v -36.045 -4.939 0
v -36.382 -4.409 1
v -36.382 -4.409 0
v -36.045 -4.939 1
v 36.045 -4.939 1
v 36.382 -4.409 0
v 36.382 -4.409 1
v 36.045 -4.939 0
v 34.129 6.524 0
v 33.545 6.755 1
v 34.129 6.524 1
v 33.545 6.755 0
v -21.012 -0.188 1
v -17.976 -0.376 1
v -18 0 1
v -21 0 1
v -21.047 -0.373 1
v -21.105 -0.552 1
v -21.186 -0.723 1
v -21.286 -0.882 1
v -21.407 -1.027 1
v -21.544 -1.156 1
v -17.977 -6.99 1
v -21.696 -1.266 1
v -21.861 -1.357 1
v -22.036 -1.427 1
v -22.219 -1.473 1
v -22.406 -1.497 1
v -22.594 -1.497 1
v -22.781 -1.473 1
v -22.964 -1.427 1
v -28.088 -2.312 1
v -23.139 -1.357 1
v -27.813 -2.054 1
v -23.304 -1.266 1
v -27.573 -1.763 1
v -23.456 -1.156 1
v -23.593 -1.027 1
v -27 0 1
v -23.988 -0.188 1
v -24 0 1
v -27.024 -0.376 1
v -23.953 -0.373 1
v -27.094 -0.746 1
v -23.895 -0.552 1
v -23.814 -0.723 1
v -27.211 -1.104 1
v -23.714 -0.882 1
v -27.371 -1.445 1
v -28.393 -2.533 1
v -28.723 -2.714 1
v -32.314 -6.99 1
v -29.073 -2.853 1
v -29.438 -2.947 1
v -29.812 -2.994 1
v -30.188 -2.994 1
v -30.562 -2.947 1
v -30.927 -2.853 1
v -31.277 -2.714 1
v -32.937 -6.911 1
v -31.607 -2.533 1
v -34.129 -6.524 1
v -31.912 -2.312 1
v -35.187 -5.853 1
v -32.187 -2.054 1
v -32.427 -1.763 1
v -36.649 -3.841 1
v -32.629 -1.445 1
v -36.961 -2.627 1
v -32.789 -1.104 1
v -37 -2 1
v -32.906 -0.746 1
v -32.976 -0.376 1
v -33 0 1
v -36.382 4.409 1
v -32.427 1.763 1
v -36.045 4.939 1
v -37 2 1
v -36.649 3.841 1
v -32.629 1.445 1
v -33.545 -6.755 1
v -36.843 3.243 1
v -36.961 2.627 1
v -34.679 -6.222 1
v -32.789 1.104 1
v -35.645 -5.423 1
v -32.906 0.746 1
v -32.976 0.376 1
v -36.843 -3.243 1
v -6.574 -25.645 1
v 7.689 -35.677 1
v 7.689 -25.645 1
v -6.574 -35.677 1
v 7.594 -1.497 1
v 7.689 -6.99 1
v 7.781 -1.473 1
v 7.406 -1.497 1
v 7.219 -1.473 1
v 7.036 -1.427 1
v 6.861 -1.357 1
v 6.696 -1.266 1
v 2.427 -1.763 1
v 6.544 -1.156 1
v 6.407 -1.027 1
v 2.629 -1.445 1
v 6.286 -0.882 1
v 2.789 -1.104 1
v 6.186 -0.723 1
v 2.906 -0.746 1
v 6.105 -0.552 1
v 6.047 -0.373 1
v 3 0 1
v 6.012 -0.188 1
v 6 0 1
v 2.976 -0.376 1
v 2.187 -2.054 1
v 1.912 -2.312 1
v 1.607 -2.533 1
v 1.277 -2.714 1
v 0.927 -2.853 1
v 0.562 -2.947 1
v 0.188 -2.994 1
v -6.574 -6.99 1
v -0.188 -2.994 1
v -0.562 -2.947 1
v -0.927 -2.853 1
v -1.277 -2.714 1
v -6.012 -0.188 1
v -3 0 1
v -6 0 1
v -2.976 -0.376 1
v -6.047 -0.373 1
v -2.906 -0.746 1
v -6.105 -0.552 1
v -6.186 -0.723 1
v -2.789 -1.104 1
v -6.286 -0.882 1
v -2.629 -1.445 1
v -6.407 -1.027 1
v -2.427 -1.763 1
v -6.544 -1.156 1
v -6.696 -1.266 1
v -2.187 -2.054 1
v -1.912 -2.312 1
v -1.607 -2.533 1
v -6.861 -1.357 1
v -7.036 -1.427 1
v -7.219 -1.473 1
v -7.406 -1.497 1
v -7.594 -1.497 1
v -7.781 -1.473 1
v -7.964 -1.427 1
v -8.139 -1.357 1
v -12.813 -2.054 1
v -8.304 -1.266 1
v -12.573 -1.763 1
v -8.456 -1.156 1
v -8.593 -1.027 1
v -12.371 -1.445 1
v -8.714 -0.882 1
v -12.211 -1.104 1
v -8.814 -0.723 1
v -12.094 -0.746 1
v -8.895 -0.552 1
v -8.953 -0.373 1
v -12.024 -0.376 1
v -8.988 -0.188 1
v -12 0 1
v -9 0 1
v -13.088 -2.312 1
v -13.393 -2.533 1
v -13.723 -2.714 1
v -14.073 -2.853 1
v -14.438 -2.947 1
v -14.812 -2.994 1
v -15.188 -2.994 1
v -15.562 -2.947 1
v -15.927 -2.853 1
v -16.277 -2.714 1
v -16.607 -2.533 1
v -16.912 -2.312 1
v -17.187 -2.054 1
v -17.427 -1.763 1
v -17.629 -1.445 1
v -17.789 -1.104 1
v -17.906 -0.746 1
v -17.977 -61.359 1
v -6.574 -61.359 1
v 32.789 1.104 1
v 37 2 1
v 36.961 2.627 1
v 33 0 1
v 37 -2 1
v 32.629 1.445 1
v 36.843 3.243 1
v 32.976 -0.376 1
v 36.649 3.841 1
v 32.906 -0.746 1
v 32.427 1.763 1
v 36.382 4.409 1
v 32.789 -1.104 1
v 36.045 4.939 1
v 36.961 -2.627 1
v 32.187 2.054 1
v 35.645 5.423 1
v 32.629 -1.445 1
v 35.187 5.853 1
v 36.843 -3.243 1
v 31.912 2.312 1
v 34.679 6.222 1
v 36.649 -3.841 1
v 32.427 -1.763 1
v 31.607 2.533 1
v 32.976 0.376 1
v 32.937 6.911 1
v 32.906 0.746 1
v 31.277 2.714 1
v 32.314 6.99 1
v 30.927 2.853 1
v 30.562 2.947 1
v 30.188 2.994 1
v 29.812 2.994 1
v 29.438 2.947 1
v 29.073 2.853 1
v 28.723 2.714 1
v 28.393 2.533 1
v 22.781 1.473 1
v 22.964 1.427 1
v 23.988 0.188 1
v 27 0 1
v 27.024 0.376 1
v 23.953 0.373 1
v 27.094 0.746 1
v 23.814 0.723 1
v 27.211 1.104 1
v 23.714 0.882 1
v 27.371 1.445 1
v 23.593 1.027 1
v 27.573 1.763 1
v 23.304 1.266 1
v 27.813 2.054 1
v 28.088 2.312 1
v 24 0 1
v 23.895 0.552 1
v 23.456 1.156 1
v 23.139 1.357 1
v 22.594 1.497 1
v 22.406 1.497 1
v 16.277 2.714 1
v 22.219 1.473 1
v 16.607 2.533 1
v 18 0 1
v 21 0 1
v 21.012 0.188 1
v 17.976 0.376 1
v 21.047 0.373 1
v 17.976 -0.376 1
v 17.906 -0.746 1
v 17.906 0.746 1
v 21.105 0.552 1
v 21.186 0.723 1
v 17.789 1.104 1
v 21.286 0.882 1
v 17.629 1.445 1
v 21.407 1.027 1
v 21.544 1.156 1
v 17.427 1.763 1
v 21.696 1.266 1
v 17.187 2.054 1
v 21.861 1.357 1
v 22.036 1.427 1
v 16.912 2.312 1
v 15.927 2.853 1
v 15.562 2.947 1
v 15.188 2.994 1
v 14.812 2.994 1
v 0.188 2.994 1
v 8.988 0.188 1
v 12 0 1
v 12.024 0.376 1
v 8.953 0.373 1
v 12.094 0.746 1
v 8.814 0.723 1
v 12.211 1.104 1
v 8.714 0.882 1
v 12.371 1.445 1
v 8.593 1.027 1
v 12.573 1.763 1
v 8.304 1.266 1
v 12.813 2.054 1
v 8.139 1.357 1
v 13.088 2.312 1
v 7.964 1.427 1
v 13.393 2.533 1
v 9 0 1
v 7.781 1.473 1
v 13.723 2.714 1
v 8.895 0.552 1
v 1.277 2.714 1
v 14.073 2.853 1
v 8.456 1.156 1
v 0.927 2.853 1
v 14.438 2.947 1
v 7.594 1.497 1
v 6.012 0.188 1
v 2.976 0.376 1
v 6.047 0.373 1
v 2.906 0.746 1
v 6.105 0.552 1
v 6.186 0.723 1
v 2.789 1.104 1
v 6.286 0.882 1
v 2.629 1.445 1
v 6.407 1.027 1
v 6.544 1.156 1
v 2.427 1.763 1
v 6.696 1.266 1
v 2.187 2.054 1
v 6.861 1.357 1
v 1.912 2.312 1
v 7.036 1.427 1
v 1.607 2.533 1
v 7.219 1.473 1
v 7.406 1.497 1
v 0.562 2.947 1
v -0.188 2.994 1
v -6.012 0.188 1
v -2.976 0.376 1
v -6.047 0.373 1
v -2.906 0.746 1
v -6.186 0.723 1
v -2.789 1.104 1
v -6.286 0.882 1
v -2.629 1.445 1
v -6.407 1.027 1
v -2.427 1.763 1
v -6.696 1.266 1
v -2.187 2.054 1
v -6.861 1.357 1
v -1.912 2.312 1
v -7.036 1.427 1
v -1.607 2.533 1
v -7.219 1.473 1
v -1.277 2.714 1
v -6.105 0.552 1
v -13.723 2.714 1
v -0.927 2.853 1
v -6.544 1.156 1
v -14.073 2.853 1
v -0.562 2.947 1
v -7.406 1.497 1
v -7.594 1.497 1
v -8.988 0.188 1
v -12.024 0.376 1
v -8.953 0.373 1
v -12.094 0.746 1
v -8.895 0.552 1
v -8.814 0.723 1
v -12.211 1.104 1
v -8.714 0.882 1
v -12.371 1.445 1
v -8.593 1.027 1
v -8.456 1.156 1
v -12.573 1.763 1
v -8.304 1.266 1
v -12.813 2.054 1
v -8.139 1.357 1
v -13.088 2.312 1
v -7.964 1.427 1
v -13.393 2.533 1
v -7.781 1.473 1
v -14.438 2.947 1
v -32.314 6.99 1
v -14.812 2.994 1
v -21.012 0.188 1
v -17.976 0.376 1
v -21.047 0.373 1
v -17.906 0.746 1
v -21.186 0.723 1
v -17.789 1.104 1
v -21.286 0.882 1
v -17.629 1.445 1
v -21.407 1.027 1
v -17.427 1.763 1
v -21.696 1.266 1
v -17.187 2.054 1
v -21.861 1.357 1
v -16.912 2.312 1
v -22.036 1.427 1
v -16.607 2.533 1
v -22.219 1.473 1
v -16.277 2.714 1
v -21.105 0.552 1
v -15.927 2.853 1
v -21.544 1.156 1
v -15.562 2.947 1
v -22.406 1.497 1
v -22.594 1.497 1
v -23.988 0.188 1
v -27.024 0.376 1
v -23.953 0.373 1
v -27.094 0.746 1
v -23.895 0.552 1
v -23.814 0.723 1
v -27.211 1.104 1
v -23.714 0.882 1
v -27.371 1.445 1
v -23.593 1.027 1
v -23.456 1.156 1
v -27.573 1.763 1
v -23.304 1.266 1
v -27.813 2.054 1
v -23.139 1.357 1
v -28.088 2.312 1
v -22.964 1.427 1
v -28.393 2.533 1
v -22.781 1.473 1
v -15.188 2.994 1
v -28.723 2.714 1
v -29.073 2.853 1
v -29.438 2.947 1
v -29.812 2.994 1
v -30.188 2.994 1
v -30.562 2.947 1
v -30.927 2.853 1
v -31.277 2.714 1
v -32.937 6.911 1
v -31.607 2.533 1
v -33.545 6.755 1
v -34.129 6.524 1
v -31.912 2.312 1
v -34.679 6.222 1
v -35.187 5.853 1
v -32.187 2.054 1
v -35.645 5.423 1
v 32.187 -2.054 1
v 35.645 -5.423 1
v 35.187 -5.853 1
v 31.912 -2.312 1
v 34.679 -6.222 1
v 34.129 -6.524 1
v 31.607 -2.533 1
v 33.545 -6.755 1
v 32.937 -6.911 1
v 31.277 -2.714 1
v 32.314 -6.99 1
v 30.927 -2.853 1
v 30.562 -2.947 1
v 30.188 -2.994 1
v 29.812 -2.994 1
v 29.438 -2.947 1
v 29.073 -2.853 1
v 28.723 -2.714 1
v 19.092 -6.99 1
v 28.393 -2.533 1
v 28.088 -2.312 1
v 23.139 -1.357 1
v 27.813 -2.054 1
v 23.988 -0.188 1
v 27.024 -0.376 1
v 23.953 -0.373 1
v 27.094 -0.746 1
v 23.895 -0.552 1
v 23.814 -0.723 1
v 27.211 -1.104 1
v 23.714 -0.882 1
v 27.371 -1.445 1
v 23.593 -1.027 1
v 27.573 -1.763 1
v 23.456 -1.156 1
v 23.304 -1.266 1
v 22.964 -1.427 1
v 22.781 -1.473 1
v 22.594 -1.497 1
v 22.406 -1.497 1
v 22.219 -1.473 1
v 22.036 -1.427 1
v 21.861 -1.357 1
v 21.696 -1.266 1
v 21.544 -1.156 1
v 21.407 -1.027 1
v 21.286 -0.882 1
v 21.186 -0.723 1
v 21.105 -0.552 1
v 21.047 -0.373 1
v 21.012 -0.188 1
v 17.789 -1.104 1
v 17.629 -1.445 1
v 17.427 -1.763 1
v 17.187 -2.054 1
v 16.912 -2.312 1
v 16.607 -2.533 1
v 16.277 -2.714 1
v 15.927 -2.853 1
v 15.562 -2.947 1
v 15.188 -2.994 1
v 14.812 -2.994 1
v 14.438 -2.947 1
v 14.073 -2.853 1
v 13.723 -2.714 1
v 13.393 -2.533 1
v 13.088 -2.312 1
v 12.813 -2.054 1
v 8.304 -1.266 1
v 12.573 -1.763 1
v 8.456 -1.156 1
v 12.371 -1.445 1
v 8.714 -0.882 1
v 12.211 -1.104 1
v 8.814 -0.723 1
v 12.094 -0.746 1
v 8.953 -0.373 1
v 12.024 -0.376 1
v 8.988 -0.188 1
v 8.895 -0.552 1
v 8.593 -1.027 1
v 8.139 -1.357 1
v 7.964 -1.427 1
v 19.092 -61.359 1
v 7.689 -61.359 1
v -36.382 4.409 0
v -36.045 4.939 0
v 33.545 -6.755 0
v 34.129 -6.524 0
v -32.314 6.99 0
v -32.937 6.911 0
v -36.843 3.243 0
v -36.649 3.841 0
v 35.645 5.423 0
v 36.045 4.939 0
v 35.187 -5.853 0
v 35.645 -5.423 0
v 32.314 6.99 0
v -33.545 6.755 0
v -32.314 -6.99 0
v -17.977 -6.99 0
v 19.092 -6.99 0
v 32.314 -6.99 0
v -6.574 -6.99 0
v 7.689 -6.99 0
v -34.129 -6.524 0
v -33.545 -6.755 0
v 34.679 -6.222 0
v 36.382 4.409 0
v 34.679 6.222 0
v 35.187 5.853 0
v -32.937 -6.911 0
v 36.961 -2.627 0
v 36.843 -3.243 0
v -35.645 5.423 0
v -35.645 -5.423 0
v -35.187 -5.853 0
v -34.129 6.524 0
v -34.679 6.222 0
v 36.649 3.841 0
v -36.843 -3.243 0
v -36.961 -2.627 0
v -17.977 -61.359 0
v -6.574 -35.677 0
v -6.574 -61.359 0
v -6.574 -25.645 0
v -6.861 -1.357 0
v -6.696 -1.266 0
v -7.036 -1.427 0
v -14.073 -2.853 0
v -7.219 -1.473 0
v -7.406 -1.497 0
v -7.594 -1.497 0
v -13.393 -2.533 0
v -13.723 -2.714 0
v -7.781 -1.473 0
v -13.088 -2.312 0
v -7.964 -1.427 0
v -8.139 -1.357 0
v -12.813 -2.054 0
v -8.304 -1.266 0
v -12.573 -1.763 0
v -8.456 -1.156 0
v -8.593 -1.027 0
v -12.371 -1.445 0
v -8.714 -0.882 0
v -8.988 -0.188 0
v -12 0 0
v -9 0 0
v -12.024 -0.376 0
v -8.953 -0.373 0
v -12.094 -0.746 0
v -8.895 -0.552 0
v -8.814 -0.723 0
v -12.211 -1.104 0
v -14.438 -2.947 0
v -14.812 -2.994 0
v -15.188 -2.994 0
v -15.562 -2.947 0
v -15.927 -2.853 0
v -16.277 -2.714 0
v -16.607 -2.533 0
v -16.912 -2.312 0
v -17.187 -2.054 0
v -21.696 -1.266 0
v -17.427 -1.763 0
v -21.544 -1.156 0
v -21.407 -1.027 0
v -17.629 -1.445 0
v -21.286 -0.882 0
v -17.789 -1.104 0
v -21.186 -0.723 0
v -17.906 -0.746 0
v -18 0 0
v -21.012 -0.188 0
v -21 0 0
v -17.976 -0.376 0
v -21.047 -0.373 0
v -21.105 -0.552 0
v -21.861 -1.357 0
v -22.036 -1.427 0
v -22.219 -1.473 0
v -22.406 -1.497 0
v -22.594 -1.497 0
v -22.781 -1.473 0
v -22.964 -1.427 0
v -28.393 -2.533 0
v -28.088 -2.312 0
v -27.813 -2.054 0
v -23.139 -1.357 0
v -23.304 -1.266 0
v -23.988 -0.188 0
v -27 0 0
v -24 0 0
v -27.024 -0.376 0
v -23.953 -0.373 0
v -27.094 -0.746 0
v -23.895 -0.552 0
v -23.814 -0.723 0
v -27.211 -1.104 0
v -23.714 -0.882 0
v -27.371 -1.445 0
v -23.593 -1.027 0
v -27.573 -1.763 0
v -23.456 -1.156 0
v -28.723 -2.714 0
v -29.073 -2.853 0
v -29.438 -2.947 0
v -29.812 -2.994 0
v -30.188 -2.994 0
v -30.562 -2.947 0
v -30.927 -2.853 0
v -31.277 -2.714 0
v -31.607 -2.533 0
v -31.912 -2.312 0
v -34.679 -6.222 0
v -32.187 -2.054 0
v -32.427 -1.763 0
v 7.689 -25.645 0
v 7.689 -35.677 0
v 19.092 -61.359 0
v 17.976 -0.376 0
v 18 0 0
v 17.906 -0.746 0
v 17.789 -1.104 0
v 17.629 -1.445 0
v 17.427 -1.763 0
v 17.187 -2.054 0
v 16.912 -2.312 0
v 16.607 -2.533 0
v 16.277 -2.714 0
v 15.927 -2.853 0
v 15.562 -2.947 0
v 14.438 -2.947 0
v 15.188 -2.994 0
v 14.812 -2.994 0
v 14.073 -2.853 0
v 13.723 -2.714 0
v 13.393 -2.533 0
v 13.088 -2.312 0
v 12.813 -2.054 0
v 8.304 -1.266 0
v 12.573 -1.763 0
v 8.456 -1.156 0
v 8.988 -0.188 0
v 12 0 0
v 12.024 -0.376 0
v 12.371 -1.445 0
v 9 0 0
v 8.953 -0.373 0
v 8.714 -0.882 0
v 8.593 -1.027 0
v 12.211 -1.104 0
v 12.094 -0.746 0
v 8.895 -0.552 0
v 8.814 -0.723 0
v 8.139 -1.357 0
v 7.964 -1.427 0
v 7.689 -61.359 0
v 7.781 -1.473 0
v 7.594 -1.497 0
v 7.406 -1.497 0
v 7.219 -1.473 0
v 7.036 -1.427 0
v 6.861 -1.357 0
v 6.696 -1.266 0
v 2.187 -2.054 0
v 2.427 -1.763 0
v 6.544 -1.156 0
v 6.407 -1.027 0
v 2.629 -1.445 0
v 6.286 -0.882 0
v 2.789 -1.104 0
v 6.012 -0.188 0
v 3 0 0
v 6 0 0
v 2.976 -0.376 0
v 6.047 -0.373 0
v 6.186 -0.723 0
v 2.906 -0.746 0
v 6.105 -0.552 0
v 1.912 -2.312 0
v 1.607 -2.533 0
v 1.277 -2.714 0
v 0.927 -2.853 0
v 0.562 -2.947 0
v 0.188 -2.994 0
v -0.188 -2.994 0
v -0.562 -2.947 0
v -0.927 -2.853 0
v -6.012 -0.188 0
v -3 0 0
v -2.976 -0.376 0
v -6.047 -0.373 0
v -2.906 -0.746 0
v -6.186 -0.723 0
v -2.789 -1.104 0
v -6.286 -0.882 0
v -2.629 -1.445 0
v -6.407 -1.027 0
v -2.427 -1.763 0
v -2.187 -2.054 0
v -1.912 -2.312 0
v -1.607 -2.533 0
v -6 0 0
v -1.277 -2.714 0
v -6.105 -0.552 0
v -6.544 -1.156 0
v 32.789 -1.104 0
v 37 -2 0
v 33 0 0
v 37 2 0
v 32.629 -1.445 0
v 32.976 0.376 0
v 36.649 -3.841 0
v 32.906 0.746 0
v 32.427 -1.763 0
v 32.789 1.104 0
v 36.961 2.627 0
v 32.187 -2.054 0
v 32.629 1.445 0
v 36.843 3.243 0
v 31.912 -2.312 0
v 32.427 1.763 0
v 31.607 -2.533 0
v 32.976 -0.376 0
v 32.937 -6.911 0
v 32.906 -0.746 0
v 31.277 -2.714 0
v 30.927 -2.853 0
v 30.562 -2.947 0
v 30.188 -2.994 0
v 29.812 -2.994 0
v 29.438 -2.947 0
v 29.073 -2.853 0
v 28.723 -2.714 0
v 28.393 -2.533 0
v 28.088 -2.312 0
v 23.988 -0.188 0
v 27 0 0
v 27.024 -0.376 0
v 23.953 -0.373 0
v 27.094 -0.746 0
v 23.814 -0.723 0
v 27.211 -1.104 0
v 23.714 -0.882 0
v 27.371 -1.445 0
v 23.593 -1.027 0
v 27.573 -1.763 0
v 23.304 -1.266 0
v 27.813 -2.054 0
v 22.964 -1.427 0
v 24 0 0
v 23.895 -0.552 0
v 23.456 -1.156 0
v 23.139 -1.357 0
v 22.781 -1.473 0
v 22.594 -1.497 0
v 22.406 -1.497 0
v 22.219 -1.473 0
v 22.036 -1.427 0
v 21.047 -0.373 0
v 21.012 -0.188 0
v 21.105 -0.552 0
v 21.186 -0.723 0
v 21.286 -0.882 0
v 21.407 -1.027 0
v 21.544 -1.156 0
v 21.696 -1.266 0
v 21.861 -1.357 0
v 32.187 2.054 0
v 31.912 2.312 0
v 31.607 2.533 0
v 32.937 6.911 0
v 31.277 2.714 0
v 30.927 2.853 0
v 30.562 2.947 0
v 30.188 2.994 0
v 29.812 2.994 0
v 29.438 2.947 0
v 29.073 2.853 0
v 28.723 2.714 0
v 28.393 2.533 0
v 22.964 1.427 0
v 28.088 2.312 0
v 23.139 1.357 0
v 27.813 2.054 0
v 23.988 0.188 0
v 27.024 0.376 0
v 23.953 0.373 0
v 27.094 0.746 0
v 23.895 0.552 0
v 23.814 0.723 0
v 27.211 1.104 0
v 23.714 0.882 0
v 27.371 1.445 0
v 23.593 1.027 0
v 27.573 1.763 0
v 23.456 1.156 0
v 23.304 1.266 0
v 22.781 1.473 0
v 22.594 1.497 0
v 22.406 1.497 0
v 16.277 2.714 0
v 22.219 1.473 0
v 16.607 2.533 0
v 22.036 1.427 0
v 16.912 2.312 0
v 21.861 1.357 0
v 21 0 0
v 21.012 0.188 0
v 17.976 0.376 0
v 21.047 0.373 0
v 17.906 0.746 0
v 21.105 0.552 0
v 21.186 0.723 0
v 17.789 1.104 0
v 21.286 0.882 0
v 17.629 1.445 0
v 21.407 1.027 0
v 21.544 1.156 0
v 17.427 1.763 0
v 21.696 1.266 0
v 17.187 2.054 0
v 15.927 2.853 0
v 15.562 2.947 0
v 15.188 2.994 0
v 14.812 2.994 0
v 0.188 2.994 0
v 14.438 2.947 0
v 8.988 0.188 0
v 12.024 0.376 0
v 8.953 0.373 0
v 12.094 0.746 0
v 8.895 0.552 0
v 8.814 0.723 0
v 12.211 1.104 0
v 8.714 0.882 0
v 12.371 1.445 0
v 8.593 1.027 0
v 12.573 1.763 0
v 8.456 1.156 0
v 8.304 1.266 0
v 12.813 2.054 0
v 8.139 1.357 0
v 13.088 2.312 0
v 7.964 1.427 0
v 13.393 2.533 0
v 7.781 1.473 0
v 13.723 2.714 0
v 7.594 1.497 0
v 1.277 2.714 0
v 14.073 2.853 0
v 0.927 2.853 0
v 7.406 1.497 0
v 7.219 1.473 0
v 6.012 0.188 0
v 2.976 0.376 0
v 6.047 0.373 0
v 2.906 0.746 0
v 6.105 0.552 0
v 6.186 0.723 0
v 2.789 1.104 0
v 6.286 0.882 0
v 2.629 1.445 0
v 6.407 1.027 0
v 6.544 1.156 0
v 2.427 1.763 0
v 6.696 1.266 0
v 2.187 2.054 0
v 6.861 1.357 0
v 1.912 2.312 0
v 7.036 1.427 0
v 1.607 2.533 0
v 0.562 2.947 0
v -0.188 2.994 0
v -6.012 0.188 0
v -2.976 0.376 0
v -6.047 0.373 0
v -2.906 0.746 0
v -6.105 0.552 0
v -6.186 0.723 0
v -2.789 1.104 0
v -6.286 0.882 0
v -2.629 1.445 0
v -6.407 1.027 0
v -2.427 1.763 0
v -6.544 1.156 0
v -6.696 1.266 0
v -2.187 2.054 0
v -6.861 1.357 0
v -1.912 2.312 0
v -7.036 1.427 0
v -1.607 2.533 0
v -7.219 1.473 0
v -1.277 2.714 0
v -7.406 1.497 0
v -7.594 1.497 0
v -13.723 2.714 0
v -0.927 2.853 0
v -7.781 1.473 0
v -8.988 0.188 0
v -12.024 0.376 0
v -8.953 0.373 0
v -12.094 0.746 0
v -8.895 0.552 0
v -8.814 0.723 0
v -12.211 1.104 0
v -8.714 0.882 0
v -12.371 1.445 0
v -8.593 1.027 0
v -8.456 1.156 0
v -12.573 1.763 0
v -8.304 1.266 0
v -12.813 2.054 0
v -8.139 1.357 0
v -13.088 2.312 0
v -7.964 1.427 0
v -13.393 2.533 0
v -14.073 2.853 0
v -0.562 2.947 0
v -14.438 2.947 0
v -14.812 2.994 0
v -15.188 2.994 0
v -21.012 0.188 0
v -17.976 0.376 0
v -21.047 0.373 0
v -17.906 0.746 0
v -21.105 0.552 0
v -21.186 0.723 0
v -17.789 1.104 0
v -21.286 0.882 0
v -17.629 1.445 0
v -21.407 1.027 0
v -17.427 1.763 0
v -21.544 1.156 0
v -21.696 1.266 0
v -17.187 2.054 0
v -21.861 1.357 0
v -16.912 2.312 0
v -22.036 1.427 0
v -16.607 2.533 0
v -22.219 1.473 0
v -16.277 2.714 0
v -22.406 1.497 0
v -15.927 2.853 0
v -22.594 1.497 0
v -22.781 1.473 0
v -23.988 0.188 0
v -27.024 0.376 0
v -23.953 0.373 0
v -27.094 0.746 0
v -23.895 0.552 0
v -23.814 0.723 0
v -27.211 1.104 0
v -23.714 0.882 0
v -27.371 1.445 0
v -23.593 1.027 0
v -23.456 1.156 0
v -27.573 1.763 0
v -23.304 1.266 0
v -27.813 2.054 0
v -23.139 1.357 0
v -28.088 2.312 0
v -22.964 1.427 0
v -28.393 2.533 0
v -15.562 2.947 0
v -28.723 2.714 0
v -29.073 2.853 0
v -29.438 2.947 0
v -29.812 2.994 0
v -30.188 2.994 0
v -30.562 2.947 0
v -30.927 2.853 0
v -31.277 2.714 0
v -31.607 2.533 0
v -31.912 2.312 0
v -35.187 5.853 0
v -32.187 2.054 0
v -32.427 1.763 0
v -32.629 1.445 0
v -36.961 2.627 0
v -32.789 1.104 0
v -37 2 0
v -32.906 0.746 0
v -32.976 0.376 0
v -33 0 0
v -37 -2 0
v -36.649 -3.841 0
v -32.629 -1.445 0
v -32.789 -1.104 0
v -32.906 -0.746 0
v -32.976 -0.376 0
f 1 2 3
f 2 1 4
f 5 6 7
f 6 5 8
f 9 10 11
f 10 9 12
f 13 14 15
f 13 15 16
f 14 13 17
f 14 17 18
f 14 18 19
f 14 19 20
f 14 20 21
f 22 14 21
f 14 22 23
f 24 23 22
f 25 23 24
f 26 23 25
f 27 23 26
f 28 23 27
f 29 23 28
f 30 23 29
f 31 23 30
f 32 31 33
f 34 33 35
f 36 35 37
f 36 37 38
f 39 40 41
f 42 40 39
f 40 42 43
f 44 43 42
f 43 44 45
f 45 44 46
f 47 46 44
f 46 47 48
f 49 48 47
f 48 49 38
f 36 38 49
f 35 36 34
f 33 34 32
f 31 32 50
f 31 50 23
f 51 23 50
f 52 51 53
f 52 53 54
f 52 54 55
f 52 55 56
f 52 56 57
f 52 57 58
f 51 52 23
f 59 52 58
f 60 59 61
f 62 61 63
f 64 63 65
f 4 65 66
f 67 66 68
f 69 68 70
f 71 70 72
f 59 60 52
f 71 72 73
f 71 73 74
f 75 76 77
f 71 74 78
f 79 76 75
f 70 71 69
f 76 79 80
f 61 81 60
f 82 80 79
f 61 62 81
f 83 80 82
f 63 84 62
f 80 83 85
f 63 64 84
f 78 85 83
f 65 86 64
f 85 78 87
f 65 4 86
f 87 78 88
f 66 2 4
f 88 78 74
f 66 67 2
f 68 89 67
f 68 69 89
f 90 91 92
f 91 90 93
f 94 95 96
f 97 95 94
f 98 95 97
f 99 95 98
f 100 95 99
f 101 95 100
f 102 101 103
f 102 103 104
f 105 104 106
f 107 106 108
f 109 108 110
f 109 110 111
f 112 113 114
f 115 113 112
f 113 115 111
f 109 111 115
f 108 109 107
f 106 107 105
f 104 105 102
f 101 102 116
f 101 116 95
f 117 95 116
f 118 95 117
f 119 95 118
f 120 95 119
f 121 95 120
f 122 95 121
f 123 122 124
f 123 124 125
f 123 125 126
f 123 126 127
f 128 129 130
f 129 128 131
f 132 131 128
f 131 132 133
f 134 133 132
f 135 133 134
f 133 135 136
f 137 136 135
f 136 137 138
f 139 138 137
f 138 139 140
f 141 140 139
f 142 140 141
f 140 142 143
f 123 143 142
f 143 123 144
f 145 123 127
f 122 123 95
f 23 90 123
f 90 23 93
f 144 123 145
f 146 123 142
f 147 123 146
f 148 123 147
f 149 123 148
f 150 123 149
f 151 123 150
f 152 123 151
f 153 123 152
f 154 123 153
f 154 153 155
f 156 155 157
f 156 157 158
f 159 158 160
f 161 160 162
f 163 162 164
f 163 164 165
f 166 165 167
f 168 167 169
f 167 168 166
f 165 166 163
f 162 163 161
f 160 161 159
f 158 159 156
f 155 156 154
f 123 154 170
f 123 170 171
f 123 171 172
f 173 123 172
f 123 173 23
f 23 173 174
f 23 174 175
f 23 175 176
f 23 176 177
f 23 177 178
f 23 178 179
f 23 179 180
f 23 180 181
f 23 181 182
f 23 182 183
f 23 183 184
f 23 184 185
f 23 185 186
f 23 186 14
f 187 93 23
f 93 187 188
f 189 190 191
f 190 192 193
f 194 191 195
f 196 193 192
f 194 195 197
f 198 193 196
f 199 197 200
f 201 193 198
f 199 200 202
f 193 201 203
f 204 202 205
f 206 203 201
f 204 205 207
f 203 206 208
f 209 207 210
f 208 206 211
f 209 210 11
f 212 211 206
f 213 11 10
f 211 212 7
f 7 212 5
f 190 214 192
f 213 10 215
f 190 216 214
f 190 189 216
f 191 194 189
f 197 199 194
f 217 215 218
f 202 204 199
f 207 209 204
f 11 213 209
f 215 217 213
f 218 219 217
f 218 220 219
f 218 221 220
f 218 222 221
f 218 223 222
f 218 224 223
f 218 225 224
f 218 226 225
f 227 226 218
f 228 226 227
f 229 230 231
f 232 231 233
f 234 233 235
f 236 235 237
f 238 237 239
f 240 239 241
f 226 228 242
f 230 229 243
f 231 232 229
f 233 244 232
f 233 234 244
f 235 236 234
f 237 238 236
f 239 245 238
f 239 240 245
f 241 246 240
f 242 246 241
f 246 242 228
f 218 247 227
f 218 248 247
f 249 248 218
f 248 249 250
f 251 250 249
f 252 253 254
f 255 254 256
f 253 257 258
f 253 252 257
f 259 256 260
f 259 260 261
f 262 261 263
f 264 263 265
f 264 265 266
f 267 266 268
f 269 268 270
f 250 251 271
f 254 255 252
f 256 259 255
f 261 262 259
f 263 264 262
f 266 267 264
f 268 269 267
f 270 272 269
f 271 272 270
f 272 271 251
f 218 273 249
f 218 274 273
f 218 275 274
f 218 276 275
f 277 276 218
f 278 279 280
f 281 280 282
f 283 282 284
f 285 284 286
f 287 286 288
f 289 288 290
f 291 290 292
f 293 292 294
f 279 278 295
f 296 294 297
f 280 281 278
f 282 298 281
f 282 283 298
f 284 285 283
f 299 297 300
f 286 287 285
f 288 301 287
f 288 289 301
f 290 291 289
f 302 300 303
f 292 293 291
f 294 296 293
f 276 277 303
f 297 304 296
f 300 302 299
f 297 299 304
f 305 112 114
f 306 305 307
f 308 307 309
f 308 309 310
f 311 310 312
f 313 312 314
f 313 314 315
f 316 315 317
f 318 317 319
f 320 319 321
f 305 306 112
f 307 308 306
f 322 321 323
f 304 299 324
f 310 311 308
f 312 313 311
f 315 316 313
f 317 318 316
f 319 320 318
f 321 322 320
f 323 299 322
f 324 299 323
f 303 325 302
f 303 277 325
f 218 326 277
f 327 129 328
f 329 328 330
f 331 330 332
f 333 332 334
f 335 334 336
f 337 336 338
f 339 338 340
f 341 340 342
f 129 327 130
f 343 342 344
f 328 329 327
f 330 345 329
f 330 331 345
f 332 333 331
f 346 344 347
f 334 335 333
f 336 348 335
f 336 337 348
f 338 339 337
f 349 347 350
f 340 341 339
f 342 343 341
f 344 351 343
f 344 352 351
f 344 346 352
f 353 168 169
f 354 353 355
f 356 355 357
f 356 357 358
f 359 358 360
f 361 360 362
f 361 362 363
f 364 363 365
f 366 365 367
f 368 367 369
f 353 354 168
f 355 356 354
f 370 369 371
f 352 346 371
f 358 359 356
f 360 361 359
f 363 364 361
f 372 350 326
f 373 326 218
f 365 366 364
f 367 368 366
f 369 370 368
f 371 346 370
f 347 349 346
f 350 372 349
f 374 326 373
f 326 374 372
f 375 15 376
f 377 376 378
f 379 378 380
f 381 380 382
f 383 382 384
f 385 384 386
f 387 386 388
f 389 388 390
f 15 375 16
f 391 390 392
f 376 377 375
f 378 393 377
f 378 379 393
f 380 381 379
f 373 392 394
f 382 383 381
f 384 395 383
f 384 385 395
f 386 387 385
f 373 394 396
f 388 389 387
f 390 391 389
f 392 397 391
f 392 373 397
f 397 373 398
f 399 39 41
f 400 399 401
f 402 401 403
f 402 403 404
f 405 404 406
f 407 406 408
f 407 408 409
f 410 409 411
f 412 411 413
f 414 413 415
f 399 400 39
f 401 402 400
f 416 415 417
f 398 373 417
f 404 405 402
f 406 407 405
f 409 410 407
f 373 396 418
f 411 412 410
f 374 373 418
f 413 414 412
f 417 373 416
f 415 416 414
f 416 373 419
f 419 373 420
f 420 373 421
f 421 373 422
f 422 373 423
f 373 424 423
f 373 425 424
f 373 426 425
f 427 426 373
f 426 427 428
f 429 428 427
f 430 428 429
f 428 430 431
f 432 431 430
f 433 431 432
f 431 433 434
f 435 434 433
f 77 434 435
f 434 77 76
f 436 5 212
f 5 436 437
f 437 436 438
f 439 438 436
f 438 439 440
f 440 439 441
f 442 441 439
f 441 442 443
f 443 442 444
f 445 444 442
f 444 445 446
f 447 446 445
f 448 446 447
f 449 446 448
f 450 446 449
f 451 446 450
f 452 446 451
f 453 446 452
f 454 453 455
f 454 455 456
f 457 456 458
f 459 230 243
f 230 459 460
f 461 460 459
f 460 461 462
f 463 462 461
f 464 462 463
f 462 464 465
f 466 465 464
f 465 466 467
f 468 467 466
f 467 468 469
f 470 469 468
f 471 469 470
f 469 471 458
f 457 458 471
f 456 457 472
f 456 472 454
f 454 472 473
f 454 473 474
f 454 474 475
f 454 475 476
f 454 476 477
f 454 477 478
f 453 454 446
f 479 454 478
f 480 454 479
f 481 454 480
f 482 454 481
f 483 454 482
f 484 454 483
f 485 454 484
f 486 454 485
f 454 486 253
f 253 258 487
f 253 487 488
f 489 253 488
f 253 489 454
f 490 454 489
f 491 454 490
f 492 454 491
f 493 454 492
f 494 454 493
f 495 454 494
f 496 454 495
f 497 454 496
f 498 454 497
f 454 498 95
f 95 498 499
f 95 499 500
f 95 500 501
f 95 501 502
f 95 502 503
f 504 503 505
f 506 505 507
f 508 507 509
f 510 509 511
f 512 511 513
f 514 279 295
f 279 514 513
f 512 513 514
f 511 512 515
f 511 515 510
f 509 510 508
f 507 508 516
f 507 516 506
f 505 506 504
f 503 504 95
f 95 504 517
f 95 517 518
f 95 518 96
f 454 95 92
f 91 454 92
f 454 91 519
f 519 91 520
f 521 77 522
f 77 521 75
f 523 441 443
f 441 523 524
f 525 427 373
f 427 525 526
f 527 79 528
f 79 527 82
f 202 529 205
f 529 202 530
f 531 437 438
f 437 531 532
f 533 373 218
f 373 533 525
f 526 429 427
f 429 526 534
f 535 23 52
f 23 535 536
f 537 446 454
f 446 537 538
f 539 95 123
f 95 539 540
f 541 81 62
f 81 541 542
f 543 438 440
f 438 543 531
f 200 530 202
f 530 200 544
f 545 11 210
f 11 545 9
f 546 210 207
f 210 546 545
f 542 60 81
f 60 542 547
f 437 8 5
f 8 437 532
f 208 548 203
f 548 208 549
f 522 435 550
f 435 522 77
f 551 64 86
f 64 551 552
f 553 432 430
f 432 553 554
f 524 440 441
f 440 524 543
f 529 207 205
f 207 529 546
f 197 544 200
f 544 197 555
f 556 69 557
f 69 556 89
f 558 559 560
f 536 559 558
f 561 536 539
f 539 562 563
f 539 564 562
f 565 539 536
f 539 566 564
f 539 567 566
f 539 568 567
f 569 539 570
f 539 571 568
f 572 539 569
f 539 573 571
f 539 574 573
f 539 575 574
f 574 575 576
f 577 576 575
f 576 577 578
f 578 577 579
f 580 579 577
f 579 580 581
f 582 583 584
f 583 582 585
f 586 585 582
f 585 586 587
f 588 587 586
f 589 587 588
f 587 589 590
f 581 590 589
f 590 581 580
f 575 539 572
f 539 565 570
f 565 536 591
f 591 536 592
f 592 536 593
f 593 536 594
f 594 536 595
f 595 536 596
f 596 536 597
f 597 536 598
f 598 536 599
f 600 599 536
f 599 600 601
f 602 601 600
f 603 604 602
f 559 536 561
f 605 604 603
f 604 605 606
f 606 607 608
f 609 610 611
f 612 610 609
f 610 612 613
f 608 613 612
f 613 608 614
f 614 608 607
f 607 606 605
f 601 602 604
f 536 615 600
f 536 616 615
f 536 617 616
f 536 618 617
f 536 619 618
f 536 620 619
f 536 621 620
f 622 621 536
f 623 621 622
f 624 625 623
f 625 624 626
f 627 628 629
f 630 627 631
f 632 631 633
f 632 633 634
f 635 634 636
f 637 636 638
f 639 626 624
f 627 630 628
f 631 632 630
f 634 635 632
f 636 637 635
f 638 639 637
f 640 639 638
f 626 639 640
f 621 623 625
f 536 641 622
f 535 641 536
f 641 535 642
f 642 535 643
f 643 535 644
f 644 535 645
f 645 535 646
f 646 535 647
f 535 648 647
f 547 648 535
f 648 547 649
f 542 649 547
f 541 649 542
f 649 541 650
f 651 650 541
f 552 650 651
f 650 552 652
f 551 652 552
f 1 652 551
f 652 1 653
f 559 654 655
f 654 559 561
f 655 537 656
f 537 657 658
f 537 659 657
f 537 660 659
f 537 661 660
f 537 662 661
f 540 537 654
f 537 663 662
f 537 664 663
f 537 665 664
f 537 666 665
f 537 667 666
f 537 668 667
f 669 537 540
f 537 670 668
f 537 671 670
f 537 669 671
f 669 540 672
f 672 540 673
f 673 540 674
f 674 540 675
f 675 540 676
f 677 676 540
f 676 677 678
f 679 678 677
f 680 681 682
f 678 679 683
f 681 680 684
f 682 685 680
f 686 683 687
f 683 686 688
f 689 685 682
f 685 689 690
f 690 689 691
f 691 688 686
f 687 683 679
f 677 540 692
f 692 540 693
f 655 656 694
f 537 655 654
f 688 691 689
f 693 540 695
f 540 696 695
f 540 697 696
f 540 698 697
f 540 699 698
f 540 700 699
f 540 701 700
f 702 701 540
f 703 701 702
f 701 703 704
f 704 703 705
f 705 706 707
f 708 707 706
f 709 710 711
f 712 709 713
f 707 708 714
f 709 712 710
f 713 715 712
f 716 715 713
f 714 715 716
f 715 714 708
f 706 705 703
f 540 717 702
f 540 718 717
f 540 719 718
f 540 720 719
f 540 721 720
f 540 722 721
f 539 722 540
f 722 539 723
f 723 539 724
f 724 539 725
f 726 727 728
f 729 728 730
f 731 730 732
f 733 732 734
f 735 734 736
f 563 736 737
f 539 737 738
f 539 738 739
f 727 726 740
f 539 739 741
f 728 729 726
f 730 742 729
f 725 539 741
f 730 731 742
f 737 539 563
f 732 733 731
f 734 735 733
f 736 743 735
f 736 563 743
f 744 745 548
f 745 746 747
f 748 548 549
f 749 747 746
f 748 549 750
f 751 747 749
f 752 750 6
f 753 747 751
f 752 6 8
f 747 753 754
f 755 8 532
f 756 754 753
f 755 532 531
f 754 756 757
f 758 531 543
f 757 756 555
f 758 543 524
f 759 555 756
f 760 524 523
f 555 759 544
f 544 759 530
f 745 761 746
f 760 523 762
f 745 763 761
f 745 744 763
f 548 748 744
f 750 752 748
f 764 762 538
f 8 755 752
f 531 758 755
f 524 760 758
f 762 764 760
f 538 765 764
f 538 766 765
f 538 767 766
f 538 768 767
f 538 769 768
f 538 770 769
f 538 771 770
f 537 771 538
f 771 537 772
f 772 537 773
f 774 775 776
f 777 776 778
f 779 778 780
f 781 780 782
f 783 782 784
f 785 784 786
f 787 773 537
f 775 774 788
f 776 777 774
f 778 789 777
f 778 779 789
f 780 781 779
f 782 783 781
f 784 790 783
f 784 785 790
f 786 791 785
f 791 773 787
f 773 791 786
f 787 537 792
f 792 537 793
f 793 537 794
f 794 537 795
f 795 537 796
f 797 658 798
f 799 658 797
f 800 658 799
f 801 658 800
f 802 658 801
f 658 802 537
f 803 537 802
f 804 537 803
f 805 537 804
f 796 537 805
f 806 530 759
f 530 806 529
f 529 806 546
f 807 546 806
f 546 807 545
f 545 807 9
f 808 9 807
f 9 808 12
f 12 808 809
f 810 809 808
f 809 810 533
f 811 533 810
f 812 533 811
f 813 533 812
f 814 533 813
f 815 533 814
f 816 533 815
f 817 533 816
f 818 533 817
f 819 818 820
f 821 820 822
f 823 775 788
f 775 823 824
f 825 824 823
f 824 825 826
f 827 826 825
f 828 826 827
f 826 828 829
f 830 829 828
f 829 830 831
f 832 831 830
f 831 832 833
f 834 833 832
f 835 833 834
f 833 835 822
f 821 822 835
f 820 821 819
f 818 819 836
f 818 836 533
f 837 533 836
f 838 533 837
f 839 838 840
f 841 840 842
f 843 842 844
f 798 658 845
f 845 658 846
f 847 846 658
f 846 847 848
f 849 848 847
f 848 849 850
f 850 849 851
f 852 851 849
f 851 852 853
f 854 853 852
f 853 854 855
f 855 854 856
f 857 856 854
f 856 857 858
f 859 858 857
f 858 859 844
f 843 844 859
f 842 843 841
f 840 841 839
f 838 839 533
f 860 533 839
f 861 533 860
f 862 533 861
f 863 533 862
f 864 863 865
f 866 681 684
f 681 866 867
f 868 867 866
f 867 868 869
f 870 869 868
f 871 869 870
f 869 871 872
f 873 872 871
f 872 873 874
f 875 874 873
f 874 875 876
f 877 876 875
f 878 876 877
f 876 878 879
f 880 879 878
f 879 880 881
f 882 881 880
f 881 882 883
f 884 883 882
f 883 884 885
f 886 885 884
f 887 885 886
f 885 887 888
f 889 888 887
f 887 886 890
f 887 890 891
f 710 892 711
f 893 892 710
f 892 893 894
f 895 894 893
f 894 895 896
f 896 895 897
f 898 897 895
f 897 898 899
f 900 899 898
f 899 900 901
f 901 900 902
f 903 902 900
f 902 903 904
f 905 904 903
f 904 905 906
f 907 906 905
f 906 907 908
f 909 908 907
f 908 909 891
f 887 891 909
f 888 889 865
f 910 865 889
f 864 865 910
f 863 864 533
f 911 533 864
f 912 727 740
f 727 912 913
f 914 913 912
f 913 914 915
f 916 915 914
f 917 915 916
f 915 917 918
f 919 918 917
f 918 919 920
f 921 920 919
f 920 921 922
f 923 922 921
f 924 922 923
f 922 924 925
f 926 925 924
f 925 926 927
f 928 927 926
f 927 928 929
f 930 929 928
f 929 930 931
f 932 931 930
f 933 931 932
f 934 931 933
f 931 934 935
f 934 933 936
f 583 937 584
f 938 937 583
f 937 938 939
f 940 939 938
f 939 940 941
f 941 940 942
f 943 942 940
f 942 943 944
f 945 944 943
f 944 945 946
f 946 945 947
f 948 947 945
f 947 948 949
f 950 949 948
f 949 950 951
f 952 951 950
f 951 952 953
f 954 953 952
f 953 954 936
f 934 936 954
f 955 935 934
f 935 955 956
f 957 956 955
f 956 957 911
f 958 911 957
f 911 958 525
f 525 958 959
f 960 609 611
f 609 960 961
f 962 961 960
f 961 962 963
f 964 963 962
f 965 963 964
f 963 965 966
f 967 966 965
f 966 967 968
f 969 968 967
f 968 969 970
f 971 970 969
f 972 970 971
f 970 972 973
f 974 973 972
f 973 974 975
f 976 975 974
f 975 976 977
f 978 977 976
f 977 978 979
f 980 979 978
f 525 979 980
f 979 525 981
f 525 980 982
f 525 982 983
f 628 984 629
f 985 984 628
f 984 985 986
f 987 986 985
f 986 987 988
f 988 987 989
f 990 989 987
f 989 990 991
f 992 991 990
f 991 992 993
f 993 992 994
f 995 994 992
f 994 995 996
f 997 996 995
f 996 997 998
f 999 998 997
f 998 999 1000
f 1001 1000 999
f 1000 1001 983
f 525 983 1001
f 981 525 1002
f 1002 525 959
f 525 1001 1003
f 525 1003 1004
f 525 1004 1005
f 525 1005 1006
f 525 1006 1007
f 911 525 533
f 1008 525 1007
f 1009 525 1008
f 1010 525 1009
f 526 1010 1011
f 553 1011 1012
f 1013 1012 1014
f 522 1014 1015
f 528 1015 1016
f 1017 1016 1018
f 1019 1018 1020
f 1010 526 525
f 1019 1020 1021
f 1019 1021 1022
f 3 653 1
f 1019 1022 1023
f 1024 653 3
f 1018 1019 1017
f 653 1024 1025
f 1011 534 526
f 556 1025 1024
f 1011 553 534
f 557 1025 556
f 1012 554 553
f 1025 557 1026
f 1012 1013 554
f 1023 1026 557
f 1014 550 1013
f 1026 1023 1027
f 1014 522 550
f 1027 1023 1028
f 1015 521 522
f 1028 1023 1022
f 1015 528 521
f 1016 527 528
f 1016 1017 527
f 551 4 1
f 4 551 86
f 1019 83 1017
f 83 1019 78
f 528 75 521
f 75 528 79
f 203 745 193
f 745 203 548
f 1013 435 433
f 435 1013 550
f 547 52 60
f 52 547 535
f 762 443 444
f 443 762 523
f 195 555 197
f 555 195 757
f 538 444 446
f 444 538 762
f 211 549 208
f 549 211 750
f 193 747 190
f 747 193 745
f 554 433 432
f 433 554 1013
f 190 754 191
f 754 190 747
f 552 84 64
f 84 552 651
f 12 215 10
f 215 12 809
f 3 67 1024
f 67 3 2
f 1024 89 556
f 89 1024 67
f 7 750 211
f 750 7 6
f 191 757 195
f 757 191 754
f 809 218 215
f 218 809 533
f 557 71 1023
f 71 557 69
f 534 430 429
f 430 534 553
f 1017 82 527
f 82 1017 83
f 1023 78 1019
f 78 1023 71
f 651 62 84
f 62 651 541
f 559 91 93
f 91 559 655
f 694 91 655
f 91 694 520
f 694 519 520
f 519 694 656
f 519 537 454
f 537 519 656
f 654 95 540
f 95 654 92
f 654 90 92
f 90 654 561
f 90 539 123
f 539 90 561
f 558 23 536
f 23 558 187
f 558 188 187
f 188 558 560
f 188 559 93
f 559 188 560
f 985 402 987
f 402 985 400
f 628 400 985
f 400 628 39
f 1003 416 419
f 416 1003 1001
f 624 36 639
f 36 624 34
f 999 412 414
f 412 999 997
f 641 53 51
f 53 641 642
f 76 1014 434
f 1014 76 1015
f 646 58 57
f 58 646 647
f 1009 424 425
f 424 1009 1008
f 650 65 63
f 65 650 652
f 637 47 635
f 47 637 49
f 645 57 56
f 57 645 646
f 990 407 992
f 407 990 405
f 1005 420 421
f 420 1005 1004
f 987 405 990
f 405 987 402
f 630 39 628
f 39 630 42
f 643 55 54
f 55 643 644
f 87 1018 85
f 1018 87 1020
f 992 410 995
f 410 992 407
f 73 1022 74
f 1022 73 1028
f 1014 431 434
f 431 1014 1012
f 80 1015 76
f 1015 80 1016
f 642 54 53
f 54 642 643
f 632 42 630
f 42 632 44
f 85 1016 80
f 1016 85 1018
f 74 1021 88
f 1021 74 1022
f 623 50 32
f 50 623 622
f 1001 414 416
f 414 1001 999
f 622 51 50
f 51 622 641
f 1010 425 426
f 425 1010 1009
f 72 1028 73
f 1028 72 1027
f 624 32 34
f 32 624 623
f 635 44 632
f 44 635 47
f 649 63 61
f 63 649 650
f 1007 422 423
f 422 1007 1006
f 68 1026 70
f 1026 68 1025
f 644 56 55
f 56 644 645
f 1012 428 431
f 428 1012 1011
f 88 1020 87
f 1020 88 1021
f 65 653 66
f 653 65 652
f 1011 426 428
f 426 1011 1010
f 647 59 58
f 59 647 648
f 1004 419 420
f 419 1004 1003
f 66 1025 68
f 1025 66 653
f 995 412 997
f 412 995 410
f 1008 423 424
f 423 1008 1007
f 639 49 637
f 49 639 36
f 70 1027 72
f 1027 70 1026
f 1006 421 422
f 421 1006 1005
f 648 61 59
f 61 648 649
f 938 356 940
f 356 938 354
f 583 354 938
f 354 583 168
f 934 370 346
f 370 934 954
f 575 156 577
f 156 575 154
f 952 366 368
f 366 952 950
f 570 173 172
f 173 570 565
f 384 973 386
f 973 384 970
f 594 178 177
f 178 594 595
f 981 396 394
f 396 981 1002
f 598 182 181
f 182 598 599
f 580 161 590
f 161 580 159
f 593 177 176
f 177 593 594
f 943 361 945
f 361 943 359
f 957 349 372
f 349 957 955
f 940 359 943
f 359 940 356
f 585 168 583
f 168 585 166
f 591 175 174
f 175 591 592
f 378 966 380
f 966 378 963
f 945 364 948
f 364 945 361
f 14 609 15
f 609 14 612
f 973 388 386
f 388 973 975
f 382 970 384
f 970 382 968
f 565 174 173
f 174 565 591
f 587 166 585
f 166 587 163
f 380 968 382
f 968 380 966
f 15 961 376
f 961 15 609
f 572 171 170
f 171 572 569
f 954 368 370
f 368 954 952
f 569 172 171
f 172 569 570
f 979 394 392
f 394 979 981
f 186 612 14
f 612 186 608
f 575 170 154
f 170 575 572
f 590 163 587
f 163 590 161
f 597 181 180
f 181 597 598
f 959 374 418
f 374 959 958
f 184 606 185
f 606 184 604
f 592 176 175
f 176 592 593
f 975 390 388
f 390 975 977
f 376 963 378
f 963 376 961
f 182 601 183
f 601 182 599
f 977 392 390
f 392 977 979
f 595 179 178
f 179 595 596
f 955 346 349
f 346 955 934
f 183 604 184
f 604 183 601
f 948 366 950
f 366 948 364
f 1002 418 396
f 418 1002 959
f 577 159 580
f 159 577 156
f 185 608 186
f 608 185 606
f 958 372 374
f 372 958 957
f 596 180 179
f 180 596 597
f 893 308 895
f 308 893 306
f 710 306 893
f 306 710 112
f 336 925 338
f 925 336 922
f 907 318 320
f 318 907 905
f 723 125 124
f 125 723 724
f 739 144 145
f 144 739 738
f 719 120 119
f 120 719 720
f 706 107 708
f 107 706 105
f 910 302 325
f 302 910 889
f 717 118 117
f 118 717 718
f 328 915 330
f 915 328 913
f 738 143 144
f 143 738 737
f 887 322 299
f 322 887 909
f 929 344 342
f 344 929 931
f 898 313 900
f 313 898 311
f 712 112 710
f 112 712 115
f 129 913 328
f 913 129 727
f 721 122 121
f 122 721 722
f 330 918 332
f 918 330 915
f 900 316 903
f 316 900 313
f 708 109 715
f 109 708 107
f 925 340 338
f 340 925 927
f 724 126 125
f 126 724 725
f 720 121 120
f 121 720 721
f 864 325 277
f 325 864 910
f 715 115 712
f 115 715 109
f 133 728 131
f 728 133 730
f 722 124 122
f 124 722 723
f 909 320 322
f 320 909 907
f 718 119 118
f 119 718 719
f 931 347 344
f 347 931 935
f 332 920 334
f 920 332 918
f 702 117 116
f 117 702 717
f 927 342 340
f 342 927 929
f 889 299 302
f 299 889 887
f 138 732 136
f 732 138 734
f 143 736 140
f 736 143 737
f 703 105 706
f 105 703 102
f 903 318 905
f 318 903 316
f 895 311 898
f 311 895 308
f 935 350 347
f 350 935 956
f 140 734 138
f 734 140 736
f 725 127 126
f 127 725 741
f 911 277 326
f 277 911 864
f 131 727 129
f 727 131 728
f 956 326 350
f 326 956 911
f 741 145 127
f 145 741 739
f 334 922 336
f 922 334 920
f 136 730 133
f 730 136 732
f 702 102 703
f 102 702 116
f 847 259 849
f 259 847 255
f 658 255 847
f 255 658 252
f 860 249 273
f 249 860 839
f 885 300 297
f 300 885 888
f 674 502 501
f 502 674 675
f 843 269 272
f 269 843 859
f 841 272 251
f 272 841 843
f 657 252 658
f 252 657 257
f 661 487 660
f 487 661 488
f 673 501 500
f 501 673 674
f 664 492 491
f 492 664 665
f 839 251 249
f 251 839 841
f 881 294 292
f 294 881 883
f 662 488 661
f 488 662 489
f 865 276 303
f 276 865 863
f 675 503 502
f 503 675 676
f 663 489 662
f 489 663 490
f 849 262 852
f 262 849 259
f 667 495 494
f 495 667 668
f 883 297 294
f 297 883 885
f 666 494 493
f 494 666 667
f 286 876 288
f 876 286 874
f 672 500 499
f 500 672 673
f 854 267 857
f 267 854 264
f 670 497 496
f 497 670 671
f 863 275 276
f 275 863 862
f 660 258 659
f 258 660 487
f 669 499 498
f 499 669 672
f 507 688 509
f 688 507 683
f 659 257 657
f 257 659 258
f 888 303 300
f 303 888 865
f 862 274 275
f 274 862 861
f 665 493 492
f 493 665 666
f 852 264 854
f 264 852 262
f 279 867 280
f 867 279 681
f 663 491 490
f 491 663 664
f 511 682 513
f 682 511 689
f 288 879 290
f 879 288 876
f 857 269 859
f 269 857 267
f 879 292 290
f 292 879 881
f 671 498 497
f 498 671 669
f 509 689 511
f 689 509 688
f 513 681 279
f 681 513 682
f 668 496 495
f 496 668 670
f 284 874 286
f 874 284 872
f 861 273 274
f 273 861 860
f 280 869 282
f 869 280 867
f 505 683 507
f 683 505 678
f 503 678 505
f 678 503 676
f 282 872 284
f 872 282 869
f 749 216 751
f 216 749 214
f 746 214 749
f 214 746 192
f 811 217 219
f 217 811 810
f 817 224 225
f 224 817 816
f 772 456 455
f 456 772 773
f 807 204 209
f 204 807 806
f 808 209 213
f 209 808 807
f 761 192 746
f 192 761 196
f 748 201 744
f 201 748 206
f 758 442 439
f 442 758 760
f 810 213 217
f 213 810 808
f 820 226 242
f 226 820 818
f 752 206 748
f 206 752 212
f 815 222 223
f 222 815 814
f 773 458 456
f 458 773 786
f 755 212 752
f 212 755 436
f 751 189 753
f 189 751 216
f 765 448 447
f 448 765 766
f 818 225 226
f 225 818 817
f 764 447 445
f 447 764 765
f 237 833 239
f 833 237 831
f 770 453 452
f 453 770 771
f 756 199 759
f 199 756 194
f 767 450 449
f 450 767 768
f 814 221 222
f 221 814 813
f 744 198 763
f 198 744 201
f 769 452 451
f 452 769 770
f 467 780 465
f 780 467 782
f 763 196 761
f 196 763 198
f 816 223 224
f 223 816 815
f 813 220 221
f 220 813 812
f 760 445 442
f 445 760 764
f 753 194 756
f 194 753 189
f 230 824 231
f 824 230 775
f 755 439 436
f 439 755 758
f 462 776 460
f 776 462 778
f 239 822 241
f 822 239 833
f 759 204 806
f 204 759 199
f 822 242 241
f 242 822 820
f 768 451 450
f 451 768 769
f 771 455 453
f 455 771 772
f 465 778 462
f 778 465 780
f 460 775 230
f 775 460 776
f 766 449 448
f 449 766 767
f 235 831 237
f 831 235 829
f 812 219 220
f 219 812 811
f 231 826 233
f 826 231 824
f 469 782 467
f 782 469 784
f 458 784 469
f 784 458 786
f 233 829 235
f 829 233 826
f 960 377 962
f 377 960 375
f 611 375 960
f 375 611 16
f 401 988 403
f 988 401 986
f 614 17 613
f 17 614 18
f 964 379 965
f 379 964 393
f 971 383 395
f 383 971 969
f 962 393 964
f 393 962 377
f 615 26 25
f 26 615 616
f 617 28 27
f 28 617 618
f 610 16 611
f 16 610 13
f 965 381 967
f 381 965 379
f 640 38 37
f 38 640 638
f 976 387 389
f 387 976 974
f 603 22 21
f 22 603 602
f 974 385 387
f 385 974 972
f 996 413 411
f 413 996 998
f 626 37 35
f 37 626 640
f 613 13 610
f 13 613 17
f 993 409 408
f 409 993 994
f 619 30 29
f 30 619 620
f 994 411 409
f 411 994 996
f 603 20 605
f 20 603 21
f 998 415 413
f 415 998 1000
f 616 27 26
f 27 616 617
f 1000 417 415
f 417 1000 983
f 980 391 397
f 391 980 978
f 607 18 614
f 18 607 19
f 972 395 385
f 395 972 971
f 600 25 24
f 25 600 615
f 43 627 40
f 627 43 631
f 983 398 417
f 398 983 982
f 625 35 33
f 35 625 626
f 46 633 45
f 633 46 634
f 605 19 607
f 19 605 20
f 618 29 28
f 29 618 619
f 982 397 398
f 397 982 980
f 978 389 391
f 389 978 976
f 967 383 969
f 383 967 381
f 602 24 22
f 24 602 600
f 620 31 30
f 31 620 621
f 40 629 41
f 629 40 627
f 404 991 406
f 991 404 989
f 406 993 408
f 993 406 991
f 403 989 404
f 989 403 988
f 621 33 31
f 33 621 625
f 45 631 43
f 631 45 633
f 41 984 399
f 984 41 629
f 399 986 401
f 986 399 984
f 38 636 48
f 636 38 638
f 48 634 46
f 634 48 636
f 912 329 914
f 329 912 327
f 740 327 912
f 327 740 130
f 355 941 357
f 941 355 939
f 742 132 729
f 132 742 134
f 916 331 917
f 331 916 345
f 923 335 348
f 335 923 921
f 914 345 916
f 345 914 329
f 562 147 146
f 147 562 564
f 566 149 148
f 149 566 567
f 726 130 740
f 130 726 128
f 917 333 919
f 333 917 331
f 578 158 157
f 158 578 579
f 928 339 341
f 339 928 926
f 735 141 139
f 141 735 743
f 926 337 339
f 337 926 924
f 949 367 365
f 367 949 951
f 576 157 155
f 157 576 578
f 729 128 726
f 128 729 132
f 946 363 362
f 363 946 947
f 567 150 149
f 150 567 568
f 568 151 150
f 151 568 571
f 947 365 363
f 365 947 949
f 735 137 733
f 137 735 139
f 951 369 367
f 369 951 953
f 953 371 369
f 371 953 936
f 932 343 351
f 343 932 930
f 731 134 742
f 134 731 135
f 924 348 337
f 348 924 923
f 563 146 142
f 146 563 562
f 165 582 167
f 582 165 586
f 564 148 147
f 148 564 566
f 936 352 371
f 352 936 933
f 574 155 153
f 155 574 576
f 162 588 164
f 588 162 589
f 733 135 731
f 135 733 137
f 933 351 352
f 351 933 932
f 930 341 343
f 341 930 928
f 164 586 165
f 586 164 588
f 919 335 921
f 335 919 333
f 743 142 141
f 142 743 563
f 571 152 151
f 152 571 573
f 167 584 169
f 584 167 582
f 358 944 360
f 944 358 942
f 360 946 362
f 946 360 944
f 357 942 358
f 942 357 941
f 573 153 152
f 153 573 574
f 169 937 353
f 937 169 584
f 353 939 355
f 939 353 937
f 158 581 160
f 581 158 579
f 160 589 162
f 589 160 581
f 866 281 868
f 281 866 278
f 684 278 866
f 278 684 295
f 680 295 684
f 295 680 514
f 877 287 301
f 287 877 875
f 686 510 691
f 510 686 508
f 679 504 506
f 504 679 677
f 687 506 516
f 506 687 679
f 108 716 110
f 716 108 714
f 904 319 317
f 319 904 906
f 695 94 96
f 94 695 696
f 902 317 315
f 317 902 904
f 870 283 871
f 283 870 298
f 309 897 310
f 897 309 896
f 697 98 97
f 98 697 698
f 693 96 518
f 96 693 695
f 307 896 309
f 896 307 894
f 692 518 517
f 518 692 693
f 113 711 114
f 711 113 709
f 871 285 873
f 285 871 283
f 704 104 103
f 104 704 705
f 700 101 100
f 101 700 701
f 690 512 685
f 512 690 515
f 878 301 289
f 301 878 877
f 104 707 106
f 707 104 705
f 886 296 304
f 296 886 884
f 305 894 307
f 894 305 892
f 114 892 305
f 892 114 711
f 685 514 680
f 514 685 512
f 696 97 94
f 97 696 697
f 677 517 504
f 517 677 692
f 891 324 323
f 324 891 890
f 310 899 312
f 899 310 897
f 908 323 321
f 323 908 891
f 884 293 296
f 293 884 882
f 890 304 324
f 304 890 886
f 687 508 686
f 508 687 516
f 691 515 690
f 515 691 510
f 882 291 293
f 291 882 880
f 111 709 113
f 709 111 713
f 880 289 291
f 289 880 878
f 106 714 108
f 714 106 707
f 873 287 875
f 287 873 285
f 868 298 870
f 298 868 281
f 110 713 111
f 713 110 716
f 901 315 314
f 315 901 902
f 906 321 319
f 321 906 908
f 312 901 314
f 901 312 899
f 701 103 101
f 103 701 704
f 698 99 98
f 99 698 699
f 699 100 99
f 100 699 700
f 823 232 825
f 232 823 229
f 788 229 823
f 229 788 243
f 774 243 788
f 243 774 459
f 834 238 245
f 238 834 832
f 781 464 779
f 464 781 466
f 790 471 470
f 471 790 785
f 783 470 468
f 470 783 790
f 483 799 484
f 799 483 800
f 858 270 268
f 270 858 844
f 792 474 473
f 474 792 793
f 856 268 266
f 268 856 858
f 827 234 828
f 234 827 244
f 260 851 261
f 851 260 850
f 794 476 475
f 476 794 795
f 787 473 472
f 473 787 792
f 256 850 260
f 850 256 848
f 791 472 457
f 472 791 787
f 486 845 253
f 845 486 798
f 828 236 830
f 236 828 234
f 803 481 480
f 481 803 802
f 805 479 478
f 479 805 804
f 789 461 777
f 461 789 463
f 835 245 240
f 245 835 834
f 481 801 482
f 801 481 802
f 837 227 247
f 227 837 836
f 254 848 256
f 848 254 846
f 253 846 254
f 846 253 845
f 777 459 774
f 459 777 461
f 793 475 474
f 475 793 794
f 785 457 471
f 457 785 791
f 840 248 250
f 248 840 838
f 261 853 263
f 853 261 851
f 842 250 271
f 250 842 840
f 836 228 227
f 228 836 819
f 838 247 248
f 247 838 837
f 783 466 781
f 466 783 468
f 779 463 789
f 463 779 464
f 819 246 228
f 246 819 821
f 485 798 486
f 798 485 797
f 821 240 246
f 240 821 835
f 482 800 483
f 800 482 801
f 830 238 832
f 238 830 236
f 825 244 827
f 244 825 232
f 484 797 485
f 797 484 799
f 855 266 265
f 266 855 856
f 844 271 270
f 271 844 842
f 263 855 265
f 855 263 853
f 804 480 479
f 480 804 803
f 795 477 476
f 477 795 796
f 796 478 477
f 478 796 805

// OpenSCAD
$fn = 50;


difference() {
	union() {
		hull() {
			translate(v = [-32.0000000000, 2.0000000000, 0]) {
				cylinder(h = 1, r = 5);
			}
			translate(v = [32.0000000000, 2.0000000000, 0]) {
				cylinder(h = 1, r = 5);
			}
			translate(v = [-32.0000000000, -2.0000000000, 0]) {
				cylinder(h = 1, r = 5);
			}
			translate(v = [32.0000000000, -2.0000000000, 0]) {
				cylinder(h = 1, r = 5);
			}
		}
		translate(v = [0, -5, 0]) {
			linear_extrude(height = 1) {
				text(font = "DejaVu Sans Mono:style=Bold", halign = "center", size = 57.0000000000, text = "H", valign = "top");
			}
		}
	}
	union() {
		translate(v = [-30.0000000000, 0.0000000000, 0]) {
			translate(v = [0, 0, -100]) {
				cylinder(h = 200, r = 3.0000000000);
			}
		}
		translate(v = [-15.0000000000, 0.0000000000, 0]) {
			translate(v = [0, 0, -100]) {
				cylinder(h = 200, r = 3.0000000000);
			}
		}
		translate(v = [0, 0, -100]) {
			cylinder(h = 200, r = 3.0000000000);
		}
		translate(v = [15.0000000000, 0.0000000000, 0]) {
			translate(v = [0, 0, -100]) {
				cylinder(h = 200, r = 3.0000000000);
			}
		}
		translate(v = [30.0000000000, 0.0000000000, 0]) {
			translate(v = [0, 0, -100]) {
				cylinder(h = 200, r = 3.0000000000);
			}
		}
		translate(v = [-30.0000000000, 0.0000000000, 0]) {
			translate(v = [0, 0, -100]) {
				cylinder(h = 200, r = 1.5000000000);
			}
		}
		translate(v = [-22.5000000000, 0.0000000000, 0]) {
			translate(v = [0, 0, -100]) {
				cylinder(h = 200, r = 1.5000000000);
			}
		}
		translate(v = [-15.0000000000, 0.0000000000, 0]) {
			translate(v = [0, 0, -100]) {
				cylinder(h = 200, r = 1.5000000000);
			}
		}
		translate(v = [-7.5000000000, 0.0000000000, 0]) {
			translate(v = [0, 0, -100]) {
				cylinder(h = 200, r = 1.5000000000);
			}
		}
		translate(v = [0, 0, -100]) {
			cylinder(h = 200, r = 1.5000000000);
		}
		translate(v = [7.5000000000, 0.0000000000, 0]) {
			translate(v = [0, 0, -100]) {
				cylinder(h = 200, r = 1.5000000000);
			}
		}
		translate(v = [15.0000000000, 0.0000000000, 0]) {
			translate(v = [0, 0, -100]) {
				cylinder(h = 200, r = 1.5000000000);
			}
		}
		translate(v = [22.5000000000, 0.0000000000, 0]) {
			translate(v = [0, 0, -100]) {
				cylinder(h = 200, r = 1.5000000000);
			}
		}
		translate(v = [30.0000000000, 0.0000000000, 0]) {
			translate(v = [0, 0, -100]) {
				cylinder(h = 200, r = 1.5000000000);
			}
		}
	}
}
